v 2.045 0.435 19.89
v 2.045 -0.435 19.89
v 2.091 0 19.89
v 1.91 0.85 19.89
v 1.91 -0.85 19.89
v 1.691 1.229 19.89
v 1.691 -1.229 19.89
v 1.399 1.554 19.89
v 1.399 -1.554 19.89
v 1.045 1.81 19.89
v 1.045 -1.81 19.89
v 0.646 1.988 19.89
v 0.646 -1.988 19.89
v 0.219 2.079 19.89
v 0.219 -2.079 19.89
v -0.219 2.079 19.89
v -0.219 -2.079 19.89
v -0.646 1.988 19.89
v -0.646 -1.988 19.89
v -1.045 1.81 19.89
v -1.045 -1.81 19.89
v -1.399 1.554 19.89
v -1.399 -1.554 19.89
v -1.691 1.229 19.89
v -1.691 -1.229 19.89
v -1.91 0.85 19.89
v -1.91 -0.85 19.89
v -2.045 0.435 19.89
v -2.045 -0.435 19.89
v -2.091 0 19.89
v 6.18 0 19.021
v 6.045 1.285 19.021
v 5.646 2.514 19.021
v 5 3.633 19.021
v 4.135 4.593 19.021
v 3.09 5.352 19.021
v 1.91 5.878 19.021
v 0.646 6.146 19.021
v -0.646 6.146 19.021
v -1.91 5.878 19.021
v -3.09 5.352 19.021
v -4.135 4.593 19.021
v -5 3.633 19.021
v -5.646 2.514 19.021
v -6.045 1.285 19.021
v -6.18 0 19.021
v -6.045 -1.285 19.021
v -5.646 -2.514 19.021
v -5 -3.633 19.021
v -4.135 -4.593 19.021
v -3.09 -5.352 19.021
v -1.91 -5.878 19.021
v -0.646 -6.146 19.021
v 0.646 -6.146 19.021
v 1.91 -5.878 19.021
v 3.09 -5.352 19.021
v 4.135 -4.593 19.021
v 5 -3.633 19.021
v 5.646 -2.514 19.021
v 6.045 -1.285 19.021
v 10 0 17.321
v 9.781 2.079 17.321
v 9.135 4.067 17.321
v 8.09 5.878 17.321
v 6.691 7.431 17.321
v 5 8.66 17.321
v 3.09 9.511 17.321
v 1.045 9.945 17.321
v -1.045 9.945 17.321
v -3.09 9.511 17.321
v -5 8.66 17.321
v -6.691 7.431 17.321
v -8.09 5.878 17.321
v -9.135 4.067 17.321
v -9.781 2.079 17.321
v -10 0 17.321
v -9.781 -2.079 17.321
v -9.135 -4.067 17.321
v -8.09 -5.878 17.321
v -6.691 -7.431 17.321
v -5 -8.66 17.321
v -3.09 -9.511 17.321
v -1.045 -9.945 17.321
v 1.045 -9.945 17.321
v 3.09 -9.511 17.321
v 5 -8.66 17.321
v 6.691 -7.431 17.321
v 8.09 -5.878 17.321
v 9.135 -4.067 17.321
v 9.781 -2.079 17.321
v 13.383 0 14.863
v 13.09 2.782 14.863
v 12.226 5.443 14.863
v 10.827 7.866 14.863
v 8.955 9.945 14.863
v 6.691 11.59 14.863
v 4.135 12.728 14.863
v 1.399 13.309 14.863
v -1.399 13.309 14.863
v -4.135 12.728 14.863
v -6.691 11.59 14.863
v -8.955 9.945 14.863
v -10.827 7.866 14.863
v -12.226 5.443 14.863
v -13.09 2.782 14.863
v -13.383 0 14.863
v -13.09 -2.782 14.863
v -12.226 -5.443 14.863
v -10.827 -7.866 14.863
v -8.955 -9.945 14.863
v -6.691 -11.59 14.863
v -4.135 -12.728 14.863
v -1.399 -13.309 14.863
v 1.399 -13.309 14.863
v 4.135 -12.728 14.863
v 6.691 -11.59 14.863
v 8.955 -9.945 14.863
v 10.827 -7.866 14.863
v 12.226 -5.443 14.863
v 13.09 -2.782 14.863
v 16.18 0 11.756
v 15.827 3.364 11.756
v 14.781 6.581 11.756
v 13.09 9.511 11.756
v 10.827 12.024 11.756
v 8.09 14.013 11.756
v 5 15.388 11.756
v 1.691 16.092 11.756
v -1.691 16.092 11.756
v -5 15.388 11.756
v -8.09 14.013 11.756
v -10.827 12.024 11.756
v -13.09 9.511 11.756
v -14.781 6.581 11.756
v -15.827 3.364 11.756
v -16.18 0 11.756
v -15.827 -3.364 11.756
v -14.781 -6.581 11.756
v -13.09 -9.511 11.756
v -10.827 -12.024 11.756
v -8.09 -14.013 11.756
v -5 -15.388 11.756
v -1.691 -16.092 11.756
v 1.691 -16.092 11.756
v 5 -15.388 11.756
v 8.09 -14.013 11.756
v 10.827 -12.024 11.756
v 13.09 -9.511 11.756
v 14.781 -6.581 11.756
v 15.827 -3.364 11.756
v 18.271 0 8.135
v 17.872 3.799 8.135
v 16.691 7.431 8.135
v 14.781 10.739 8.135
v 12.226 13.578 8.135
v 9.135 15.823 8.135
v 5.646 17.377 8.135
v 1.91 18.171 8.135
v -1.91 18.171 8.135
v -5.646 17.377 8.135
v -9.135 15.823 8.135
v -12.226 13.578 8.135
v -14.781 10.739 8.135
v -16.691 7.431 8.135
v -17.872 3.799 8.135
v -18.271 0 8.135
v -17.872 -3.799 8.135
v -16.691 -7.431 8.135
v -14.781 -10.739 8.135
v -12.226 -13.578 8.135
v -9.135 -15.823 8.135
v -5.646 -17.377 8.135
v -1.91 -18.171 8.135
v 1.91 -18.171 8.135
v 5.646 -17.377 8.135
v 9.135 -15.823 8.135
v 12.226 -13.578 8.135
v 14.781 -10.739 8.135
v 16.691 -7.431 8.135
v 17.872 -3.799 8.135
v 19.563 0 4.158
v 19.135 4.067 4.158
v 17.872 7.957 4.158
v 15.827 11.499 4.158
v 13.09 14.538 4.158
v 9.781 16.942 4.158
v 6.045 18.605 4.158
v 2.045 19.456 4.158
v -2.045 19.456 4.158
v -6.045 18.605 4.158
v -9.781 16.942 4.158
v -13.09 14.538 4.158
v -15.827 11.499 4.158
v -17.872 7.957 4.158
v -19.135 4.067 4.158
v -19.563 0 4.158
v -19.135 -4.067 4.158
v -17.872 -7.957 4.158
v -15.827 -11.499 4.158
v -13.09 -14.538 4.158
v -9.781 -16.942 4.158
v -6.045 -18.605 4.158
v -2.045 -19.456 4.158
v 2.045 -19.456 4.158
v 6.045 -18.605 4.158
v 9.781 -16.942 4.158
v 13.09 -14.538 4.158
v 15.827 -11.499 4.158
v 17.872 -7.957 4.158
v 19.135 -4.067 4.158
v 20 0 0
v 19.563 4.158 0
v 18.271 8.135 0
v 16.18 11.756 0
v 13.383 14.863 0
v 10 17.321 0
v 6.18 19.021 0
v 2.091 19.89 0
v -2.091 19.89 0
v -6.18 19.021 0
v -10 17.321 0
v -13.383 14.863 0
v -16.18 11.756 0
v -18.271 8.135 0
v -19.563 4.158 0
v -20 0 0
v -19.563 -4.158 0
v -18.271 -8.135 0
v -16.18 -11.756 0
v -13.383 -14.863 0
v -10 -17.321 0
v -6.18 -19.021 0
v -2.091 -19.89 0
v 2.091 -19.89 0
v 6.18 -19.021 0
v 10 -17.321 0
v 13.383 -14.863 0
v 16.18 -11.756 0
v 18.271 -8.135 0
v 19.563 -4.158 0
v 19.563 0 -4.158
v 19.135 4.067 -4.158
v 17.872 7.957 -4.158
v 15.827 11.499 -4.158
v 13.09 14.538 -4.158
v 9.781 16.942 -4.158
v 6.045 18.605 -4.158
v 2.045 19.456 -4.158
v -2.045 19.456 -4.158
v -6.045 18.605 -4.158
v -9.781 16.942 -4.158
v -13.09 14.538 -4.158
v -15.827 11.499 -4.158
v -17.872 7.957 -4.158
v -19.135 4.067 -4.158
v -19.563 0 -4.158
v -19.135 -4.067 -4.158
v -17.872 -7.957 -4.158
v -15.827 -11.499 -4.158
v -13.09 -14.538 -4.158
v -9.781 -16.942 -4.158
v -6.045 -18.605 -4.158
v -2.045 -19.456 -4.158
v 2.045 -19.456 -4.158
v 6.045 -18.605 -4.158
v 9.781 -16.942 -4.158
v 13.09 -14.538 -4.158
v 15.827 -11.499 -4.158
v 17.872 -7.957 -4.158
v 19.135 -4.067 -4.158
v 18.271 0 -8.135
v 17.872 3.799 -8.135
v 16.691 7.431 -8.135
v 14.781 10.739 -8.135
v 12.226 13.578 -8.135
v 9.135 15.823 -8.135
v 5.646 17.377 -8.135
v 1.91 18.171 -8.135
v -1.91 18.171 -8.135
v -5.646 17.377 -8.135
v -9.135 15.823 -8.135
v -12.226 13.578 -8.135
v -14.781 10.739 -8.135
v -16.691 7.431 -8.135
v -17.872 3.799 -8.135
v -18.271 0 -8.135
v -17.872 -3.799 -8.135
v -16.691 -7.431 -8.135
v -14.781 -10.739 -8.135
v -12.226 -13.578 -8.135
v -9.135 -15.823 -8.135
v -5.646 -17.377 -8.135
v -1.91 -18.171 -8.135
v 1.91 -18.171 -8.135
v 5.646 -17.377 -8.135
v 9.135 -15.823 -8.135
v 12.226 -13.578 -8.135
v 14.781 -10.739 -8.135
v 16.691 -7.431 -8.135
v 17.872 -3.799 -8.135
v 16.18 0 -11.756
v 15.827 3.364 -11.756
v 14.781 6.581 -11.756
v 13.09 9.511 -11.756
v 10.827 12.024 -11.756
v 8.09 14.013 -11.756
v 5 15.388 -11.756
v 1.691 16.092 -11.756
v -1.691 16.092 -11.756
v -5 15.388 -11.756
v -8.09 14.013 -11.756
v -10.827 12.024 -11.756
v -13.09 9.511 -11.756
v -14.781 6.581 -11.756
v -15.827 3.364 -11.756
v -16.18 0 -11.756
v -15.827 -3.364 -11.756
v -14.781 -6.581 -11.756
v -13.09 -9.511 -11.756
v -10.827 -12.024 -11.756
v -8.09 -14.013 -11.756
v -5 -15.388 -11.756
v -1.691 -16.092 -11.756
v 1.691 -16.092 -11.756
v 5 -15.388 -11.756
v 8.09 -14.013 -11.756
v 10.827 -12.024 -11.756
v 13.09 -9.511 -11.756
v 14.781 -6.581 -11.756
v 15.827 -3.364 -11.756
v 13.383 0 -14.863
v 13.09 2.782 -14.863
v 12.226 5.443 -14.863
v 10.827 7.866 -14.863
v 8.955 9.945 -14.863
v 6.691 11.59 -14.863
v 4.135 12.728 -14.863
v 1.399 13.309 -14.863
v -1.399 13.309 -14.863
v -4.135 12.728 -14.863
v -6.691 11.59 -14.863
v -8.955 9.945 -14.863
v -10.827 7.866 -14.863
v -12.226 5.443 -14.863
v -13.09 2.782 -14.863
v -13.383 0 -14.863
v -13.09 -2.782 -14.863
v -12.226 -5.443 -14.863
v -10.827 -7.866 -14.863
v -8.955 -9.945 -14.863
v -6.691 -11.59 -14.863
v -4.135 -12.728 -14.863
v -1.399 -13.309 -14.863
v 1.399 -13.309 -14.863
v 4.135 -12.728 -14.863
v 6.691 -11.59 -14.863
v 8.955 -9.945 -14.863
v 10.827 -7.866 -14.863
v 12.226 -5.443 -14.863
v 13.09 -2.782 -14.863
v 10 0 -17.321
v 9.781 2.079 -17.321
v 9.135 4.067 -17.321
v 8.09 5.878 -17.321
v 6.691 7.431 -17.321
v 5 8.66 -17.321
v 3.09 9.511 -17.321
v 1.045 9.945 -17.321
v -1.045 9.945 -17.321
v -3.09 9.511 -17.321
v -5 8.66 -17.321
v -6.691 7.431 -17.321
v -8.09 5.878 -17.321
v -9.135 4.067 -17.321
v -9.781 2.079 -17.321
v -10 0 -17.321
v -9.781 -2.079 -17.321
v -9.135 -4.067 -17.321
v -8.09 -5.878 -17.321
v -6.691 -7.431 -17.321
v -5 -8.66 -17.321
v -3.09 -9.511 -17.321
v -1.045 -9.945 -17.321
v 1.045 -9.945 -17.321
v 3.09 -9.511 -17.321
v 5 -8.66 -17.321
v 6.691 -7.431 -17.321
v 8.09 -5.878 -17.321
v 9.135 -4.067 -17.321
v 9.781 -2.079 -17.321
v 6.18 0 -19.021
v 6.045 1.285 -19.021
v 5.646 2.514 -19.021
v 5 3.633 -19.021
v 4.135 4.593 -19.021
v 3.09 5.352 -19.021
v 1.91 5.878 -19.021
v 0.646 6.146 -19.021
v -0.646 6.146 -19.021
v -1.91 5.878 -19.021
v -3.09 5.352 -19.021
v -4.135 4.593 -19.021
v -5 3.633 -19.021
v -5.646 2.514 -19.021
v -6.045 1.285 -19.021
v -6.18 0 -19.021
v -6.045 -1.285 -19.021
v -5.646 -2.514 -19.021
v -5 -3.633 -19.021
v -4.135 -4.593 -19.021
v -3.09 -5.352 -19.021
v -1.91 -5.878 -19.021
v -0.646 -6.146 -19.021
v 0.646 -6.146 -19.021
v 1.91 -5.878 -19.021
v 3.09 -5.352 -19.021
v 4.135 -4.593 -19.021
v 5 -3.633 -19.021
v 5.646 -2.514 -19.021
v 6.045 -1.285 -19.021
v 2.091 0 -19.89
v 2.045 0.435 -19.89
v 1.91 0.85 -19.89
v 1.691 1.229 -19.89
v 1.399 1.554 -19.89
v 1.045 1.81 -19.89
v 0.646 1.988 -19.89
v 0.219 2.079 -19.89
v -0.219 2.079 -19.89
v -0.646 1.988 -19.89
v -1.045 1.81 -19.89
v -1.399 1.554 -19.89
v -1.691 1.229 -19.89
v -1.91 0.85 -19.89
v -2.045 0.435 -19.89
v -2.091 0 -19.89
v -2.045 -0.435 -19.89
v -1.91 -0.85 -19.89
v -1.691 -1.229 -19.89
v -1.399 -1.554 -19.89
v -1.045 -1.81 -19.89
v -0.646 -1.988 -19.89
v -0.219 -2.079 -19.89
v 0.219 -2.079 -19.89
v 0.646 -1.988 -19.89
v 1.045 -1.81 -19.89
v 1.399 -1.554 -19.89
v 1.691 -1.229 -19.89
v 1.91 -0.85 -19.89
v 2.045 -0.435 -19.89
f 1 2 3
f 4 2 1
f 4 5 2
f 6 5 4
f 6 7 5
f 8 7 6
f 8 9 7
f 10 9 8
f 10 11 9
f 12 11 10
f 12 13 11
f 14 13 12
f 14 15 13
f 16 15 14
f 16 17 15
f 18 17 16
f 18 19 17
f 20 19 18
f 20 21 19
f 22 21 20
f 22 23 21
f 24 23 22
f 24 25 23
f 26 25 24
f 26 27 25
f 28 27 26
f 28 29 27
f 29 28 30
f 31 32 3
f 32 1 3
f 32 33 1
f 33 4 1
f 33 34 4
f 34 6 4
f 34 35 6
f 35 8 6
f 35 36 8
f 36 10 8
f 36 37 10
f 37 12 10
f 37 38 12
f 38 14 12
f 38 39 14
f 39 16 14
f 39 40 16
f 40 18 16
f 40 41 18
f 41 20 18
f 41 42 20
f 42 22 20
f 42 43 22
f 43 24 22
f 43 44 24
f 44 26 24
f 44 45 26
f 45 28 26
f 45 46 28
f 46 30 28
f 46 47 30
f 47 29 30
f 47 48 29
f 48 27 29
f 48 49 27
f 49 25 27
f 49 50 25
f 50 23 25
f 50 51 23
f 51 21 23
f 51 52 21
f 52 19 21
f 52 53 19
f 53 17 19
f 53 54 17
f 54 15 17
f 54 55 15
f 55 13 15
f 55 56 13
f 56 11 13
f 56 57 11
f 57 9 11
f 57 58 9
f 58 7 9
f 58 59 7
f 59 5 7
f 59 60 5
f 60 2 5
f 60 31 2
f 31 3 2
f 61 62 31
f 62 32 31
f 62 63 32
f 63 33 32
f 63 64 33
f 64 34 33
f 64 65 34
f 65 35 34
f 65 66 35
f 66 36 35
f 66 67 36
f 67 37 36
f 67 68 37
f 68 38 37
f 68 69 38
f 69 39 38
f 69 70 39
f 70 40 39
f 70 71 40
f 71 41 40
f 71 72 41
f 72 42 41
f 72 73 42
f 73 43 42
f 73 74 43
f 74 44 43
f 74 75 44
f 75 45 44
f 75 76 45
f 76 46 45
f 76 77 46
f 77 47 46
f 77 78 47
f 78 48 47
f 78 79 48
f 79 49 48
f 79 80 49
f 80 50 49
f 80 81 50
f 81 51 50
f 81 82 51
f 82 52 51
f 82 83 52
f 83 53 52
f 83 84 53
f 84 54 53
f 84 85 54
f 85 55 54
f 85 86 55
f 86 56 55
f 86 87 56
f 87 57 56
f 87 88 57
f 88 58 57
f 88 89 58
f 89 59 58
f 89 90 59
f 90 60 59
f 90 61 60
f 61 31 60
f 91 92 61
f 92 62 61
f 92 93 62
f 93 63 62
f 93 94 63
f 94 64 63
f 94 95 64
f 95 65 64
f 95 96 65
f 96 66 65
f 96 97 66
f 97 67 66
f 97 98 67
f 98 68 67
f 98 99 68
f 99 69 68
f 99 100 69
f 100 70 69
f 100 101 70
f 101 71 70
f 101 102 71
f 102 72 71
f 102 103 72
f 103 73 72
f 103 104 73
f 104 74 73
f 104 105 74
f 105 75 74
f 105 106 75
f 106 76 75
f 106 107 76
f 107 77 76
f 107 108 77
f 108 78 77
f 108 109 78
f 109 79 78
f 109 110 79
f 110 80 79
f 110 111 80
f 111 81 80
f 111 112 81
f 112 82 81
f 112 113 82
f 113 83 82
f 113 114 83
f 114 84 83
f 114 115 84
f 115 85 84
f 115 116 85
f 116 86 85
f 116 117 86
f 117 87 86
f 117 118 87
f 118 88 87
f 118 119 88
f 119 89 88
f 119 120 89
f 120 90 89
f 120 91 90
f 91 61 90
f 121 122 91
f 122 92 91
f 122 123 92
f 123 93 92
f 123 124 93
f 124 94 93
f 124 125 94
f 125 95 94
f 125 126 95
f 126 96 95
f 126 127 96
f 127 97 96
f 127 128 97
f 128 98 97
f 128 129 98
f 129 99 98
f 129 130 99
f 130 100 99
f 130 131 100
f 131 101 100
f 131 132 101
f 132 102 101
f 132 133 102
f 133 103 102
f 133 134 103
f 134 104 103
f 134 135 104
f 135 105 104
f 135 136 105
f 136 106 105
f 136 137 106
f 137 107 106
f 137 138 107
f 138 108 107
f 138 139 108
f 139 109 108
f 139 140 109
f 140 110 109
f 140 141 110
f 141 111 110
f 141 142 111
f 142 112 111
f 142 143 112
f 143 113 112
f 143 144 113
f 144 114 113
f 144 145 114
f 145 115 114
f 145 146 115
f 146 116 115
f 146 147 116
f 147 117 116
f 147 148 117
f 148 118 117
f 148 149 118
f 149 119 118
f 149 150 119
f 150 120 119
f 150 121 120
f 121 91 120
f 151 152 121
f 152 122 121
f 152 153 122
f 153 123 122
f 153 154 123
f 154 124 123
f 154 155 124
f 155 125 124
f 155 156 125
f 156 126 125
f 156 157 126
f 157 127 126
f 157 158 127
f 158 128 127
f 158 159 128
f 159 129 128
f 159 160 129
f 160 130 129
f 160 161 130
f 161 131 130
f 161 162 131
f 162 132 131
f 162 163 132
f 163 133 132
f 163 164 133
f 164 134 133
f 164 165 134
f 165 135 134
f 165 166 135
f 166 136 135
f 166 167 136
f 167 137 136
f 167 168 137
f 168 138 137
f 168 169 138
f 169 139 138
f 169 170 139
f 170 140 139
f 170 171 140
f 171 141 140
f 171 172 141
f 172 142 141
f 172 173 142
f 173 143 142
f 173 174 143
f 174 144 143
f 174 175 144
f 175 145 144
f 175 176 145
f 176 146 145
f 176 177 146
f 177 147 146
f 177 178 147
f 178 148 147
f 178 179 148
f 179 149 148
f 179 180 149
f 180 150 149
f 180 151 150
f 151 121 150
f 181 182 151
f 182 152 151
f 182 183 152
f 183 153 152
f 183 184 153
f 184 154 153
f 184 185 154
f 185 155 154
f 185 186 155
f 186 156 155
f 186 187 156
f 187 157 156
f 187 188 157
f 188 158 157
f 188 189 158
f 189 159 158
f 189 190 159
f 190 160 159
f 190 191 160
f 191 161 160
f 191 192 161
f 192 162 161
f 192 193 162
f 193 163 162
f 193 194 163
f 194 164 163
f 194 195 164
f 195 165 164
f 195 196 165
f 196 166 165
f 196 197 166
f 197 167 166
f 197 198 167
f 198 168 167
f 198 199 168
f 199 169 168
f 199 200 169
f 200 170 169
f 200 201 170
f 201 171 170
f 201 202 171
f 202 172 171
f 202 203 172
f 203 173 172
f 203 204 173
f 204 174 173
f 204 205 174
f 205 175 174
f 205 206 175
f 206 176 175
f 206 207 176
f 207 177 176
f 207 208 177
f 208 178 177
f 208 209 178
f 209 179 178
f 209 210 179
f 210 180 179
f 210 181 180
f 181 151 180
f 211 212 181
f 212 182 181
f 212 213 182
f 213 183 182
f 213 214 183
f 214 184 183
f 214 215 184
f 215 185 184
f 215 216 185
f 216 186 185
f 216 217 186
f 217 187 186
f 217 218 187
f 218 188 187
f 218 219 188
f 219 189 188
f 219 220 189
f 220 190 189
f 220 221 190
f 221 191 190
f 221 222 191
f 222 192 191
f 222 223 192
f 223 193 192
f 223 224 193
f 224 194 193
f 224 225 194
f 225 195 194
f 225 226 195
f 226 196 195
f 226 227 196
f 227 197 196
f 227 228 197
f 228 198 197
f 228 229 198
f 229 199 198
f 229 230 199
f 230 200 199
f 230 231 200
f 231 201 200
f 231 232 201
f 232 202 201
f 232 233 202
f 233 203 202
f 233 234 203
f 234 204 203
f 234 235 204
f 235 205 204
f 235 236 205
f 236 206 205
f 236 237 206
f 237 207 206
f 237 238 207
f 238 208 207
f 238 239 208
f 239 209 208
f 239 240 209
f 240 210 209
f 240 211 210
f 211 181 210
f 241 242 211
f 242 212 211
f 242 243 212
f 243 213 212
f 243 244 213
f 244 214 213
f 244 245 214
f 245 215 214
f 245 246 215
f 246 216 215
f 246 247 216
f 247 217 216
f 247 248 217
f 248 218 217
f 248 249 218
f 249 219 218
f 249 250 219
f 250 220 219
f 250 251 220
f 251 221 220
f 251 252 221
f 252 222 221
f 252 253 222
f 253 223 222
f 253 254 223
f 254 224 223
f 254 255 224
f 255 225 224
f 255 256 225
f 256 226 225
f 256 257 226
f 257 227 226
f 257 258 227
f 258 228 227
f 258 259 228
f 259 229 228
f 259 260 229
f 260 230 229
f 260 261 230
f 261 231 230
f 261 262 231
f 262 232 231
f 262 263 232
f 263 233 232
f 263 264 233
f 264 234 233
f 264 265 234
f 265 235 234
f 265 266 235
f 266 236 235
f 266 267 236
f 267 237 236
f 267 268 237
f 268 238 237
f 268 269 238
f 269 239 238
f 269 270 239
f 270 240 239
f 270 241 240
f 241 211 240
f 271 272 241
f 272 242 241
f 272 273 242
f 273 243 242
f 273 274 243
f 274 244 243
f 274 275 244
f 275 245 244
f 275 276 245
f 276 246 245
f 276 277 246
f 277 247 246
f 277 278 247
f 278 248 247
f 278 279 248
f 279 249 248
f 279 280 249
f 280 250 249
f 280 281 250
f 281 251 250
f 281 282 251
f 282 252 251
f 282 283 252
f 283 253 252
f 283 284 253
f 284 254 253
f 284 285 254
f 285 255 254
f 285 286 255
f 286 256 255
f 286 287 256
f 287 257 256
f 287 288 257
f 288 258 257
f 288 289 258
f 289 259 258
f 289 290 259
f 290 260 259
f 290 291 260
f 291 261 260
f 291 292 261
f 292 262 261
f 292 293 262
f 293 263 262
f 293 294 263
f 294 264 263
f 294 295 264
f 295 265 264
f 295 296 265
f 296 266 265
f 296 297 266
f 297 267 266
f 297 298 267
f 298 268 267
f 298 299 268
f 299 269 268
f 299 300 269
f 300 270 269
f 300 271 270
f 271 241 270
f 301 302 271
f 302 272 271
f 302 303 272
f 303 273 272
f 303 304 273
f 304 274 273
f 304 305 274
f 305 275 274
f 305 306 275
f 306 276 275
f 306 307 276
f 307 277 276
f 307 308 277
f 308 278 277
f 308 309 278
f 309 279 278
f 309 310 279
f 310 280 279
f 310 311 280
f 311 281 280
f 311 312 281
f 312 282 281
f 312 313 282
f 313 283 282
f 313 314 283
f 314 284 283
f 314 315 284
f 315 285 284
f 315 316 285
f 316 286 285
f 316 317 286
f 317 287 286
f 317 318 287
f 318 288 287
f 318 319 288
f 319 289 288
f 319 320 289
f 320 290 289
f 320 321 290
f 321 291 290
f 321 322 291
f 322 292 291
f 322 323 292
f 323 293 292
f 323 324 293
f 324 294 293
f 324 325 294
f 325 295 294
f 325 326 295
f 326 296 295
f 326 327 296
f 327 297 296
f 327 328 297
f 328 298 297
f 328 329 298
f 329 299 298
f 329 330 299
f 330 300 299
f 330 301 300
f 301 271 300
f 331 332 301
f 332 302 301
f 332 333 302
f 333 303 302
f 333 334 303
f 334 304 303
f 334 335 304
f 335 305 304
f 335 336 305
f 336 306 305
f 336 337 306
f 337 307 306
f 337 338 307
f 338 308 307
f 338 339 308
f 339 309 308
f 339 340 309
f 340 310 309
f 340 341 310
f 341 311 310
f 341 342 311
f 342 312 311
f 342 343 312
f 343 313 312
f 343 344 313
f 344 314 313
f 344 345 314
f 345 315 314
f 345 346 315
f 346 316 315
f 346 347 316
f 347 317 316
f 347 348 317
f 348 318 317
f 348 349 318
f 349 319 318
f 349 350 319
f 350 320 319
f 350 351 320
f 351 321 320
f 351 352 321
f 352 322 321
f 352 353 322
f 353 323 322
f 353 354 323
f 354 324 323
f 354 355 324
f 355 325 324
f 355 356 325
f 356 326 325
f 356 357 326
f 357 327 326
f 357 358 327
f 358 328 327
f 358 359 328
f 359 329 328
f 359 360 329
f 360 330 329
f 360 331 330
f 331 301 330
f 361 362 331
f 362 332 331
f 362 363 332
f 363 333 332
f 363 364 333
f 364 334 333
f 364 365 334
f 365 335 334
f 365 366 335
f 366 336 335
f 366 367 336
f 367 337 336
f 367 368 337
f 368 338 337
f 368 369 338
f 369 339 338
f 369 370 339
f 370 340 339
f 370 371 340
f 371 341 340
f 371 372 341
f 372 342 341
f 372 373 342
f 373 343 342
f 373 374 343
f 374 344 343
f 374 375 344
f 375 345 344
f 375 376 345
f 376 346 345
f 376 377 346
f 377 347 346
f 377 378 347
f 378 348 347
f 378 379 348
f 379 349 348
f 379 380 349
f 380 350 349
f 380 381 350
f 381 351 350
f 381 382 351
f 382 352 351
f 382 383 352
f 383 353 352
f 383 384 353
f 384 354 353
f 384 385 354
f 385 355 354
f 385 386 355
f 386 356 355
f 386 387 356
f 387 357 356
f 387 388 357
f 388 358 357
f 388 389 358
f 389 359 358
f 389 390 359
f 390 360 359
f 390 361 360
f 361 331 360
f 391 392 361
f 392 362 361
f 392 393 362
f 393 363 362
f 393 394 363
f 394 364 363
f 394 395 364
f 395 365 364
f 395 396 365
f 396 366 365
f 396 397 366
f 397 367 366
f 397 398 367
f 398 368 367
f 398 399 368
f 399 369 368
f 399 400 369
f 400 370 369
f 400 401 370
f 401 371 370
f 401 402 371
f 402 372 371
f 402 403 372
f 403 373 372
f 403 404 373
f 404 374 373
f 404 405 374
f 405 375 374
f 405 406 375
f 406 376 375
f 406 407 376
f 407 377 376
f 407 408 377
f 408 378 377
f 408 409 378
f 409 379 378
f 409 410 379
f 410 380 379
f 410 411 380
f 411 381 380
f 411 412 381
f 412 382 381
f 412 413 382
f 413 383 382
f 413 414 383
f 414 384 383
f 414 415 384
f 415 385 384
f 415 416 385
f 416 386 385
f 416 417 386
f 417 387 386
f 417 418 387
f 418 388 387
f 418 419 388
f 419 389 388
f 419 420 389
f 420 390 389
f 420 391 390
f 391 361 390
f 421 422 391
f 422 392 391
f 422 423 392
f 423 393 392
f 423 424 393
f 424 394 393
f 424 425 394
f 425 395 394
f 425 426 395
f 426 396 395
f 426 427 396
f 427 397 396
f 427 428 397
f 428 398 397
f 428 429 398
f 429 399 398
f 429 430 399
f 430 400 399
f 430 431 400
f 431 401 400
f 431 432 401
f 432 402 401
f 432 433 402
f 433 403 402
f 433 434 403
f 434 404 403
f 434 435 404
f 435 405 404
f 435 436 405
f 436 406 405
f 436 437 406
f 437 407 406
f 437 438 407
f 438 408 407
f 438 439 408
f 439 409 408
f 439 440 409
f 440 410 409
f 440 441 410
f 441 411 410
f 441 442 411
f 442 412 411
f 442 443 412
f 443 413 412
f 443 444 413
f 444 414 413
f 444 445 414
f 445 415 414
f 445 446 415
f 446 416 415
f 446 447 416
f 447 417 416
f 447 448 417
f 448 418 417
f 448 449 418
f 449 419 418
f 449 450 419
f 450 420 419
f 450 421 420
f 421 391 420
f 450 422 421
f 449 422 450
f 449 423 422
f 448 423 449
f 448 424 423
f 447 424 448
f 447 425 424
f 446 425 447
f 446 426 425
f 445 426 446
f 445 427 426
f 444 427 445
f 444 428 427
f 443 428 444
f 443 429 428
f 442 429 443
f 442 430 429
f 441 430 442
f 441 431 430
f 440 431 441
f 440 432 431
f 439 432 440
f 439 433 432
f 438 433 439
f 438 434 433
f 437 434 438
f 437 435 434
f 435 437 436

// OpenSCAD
a = 4;

module foo(r) {
  sphere (a*r);
}
foo(5);
